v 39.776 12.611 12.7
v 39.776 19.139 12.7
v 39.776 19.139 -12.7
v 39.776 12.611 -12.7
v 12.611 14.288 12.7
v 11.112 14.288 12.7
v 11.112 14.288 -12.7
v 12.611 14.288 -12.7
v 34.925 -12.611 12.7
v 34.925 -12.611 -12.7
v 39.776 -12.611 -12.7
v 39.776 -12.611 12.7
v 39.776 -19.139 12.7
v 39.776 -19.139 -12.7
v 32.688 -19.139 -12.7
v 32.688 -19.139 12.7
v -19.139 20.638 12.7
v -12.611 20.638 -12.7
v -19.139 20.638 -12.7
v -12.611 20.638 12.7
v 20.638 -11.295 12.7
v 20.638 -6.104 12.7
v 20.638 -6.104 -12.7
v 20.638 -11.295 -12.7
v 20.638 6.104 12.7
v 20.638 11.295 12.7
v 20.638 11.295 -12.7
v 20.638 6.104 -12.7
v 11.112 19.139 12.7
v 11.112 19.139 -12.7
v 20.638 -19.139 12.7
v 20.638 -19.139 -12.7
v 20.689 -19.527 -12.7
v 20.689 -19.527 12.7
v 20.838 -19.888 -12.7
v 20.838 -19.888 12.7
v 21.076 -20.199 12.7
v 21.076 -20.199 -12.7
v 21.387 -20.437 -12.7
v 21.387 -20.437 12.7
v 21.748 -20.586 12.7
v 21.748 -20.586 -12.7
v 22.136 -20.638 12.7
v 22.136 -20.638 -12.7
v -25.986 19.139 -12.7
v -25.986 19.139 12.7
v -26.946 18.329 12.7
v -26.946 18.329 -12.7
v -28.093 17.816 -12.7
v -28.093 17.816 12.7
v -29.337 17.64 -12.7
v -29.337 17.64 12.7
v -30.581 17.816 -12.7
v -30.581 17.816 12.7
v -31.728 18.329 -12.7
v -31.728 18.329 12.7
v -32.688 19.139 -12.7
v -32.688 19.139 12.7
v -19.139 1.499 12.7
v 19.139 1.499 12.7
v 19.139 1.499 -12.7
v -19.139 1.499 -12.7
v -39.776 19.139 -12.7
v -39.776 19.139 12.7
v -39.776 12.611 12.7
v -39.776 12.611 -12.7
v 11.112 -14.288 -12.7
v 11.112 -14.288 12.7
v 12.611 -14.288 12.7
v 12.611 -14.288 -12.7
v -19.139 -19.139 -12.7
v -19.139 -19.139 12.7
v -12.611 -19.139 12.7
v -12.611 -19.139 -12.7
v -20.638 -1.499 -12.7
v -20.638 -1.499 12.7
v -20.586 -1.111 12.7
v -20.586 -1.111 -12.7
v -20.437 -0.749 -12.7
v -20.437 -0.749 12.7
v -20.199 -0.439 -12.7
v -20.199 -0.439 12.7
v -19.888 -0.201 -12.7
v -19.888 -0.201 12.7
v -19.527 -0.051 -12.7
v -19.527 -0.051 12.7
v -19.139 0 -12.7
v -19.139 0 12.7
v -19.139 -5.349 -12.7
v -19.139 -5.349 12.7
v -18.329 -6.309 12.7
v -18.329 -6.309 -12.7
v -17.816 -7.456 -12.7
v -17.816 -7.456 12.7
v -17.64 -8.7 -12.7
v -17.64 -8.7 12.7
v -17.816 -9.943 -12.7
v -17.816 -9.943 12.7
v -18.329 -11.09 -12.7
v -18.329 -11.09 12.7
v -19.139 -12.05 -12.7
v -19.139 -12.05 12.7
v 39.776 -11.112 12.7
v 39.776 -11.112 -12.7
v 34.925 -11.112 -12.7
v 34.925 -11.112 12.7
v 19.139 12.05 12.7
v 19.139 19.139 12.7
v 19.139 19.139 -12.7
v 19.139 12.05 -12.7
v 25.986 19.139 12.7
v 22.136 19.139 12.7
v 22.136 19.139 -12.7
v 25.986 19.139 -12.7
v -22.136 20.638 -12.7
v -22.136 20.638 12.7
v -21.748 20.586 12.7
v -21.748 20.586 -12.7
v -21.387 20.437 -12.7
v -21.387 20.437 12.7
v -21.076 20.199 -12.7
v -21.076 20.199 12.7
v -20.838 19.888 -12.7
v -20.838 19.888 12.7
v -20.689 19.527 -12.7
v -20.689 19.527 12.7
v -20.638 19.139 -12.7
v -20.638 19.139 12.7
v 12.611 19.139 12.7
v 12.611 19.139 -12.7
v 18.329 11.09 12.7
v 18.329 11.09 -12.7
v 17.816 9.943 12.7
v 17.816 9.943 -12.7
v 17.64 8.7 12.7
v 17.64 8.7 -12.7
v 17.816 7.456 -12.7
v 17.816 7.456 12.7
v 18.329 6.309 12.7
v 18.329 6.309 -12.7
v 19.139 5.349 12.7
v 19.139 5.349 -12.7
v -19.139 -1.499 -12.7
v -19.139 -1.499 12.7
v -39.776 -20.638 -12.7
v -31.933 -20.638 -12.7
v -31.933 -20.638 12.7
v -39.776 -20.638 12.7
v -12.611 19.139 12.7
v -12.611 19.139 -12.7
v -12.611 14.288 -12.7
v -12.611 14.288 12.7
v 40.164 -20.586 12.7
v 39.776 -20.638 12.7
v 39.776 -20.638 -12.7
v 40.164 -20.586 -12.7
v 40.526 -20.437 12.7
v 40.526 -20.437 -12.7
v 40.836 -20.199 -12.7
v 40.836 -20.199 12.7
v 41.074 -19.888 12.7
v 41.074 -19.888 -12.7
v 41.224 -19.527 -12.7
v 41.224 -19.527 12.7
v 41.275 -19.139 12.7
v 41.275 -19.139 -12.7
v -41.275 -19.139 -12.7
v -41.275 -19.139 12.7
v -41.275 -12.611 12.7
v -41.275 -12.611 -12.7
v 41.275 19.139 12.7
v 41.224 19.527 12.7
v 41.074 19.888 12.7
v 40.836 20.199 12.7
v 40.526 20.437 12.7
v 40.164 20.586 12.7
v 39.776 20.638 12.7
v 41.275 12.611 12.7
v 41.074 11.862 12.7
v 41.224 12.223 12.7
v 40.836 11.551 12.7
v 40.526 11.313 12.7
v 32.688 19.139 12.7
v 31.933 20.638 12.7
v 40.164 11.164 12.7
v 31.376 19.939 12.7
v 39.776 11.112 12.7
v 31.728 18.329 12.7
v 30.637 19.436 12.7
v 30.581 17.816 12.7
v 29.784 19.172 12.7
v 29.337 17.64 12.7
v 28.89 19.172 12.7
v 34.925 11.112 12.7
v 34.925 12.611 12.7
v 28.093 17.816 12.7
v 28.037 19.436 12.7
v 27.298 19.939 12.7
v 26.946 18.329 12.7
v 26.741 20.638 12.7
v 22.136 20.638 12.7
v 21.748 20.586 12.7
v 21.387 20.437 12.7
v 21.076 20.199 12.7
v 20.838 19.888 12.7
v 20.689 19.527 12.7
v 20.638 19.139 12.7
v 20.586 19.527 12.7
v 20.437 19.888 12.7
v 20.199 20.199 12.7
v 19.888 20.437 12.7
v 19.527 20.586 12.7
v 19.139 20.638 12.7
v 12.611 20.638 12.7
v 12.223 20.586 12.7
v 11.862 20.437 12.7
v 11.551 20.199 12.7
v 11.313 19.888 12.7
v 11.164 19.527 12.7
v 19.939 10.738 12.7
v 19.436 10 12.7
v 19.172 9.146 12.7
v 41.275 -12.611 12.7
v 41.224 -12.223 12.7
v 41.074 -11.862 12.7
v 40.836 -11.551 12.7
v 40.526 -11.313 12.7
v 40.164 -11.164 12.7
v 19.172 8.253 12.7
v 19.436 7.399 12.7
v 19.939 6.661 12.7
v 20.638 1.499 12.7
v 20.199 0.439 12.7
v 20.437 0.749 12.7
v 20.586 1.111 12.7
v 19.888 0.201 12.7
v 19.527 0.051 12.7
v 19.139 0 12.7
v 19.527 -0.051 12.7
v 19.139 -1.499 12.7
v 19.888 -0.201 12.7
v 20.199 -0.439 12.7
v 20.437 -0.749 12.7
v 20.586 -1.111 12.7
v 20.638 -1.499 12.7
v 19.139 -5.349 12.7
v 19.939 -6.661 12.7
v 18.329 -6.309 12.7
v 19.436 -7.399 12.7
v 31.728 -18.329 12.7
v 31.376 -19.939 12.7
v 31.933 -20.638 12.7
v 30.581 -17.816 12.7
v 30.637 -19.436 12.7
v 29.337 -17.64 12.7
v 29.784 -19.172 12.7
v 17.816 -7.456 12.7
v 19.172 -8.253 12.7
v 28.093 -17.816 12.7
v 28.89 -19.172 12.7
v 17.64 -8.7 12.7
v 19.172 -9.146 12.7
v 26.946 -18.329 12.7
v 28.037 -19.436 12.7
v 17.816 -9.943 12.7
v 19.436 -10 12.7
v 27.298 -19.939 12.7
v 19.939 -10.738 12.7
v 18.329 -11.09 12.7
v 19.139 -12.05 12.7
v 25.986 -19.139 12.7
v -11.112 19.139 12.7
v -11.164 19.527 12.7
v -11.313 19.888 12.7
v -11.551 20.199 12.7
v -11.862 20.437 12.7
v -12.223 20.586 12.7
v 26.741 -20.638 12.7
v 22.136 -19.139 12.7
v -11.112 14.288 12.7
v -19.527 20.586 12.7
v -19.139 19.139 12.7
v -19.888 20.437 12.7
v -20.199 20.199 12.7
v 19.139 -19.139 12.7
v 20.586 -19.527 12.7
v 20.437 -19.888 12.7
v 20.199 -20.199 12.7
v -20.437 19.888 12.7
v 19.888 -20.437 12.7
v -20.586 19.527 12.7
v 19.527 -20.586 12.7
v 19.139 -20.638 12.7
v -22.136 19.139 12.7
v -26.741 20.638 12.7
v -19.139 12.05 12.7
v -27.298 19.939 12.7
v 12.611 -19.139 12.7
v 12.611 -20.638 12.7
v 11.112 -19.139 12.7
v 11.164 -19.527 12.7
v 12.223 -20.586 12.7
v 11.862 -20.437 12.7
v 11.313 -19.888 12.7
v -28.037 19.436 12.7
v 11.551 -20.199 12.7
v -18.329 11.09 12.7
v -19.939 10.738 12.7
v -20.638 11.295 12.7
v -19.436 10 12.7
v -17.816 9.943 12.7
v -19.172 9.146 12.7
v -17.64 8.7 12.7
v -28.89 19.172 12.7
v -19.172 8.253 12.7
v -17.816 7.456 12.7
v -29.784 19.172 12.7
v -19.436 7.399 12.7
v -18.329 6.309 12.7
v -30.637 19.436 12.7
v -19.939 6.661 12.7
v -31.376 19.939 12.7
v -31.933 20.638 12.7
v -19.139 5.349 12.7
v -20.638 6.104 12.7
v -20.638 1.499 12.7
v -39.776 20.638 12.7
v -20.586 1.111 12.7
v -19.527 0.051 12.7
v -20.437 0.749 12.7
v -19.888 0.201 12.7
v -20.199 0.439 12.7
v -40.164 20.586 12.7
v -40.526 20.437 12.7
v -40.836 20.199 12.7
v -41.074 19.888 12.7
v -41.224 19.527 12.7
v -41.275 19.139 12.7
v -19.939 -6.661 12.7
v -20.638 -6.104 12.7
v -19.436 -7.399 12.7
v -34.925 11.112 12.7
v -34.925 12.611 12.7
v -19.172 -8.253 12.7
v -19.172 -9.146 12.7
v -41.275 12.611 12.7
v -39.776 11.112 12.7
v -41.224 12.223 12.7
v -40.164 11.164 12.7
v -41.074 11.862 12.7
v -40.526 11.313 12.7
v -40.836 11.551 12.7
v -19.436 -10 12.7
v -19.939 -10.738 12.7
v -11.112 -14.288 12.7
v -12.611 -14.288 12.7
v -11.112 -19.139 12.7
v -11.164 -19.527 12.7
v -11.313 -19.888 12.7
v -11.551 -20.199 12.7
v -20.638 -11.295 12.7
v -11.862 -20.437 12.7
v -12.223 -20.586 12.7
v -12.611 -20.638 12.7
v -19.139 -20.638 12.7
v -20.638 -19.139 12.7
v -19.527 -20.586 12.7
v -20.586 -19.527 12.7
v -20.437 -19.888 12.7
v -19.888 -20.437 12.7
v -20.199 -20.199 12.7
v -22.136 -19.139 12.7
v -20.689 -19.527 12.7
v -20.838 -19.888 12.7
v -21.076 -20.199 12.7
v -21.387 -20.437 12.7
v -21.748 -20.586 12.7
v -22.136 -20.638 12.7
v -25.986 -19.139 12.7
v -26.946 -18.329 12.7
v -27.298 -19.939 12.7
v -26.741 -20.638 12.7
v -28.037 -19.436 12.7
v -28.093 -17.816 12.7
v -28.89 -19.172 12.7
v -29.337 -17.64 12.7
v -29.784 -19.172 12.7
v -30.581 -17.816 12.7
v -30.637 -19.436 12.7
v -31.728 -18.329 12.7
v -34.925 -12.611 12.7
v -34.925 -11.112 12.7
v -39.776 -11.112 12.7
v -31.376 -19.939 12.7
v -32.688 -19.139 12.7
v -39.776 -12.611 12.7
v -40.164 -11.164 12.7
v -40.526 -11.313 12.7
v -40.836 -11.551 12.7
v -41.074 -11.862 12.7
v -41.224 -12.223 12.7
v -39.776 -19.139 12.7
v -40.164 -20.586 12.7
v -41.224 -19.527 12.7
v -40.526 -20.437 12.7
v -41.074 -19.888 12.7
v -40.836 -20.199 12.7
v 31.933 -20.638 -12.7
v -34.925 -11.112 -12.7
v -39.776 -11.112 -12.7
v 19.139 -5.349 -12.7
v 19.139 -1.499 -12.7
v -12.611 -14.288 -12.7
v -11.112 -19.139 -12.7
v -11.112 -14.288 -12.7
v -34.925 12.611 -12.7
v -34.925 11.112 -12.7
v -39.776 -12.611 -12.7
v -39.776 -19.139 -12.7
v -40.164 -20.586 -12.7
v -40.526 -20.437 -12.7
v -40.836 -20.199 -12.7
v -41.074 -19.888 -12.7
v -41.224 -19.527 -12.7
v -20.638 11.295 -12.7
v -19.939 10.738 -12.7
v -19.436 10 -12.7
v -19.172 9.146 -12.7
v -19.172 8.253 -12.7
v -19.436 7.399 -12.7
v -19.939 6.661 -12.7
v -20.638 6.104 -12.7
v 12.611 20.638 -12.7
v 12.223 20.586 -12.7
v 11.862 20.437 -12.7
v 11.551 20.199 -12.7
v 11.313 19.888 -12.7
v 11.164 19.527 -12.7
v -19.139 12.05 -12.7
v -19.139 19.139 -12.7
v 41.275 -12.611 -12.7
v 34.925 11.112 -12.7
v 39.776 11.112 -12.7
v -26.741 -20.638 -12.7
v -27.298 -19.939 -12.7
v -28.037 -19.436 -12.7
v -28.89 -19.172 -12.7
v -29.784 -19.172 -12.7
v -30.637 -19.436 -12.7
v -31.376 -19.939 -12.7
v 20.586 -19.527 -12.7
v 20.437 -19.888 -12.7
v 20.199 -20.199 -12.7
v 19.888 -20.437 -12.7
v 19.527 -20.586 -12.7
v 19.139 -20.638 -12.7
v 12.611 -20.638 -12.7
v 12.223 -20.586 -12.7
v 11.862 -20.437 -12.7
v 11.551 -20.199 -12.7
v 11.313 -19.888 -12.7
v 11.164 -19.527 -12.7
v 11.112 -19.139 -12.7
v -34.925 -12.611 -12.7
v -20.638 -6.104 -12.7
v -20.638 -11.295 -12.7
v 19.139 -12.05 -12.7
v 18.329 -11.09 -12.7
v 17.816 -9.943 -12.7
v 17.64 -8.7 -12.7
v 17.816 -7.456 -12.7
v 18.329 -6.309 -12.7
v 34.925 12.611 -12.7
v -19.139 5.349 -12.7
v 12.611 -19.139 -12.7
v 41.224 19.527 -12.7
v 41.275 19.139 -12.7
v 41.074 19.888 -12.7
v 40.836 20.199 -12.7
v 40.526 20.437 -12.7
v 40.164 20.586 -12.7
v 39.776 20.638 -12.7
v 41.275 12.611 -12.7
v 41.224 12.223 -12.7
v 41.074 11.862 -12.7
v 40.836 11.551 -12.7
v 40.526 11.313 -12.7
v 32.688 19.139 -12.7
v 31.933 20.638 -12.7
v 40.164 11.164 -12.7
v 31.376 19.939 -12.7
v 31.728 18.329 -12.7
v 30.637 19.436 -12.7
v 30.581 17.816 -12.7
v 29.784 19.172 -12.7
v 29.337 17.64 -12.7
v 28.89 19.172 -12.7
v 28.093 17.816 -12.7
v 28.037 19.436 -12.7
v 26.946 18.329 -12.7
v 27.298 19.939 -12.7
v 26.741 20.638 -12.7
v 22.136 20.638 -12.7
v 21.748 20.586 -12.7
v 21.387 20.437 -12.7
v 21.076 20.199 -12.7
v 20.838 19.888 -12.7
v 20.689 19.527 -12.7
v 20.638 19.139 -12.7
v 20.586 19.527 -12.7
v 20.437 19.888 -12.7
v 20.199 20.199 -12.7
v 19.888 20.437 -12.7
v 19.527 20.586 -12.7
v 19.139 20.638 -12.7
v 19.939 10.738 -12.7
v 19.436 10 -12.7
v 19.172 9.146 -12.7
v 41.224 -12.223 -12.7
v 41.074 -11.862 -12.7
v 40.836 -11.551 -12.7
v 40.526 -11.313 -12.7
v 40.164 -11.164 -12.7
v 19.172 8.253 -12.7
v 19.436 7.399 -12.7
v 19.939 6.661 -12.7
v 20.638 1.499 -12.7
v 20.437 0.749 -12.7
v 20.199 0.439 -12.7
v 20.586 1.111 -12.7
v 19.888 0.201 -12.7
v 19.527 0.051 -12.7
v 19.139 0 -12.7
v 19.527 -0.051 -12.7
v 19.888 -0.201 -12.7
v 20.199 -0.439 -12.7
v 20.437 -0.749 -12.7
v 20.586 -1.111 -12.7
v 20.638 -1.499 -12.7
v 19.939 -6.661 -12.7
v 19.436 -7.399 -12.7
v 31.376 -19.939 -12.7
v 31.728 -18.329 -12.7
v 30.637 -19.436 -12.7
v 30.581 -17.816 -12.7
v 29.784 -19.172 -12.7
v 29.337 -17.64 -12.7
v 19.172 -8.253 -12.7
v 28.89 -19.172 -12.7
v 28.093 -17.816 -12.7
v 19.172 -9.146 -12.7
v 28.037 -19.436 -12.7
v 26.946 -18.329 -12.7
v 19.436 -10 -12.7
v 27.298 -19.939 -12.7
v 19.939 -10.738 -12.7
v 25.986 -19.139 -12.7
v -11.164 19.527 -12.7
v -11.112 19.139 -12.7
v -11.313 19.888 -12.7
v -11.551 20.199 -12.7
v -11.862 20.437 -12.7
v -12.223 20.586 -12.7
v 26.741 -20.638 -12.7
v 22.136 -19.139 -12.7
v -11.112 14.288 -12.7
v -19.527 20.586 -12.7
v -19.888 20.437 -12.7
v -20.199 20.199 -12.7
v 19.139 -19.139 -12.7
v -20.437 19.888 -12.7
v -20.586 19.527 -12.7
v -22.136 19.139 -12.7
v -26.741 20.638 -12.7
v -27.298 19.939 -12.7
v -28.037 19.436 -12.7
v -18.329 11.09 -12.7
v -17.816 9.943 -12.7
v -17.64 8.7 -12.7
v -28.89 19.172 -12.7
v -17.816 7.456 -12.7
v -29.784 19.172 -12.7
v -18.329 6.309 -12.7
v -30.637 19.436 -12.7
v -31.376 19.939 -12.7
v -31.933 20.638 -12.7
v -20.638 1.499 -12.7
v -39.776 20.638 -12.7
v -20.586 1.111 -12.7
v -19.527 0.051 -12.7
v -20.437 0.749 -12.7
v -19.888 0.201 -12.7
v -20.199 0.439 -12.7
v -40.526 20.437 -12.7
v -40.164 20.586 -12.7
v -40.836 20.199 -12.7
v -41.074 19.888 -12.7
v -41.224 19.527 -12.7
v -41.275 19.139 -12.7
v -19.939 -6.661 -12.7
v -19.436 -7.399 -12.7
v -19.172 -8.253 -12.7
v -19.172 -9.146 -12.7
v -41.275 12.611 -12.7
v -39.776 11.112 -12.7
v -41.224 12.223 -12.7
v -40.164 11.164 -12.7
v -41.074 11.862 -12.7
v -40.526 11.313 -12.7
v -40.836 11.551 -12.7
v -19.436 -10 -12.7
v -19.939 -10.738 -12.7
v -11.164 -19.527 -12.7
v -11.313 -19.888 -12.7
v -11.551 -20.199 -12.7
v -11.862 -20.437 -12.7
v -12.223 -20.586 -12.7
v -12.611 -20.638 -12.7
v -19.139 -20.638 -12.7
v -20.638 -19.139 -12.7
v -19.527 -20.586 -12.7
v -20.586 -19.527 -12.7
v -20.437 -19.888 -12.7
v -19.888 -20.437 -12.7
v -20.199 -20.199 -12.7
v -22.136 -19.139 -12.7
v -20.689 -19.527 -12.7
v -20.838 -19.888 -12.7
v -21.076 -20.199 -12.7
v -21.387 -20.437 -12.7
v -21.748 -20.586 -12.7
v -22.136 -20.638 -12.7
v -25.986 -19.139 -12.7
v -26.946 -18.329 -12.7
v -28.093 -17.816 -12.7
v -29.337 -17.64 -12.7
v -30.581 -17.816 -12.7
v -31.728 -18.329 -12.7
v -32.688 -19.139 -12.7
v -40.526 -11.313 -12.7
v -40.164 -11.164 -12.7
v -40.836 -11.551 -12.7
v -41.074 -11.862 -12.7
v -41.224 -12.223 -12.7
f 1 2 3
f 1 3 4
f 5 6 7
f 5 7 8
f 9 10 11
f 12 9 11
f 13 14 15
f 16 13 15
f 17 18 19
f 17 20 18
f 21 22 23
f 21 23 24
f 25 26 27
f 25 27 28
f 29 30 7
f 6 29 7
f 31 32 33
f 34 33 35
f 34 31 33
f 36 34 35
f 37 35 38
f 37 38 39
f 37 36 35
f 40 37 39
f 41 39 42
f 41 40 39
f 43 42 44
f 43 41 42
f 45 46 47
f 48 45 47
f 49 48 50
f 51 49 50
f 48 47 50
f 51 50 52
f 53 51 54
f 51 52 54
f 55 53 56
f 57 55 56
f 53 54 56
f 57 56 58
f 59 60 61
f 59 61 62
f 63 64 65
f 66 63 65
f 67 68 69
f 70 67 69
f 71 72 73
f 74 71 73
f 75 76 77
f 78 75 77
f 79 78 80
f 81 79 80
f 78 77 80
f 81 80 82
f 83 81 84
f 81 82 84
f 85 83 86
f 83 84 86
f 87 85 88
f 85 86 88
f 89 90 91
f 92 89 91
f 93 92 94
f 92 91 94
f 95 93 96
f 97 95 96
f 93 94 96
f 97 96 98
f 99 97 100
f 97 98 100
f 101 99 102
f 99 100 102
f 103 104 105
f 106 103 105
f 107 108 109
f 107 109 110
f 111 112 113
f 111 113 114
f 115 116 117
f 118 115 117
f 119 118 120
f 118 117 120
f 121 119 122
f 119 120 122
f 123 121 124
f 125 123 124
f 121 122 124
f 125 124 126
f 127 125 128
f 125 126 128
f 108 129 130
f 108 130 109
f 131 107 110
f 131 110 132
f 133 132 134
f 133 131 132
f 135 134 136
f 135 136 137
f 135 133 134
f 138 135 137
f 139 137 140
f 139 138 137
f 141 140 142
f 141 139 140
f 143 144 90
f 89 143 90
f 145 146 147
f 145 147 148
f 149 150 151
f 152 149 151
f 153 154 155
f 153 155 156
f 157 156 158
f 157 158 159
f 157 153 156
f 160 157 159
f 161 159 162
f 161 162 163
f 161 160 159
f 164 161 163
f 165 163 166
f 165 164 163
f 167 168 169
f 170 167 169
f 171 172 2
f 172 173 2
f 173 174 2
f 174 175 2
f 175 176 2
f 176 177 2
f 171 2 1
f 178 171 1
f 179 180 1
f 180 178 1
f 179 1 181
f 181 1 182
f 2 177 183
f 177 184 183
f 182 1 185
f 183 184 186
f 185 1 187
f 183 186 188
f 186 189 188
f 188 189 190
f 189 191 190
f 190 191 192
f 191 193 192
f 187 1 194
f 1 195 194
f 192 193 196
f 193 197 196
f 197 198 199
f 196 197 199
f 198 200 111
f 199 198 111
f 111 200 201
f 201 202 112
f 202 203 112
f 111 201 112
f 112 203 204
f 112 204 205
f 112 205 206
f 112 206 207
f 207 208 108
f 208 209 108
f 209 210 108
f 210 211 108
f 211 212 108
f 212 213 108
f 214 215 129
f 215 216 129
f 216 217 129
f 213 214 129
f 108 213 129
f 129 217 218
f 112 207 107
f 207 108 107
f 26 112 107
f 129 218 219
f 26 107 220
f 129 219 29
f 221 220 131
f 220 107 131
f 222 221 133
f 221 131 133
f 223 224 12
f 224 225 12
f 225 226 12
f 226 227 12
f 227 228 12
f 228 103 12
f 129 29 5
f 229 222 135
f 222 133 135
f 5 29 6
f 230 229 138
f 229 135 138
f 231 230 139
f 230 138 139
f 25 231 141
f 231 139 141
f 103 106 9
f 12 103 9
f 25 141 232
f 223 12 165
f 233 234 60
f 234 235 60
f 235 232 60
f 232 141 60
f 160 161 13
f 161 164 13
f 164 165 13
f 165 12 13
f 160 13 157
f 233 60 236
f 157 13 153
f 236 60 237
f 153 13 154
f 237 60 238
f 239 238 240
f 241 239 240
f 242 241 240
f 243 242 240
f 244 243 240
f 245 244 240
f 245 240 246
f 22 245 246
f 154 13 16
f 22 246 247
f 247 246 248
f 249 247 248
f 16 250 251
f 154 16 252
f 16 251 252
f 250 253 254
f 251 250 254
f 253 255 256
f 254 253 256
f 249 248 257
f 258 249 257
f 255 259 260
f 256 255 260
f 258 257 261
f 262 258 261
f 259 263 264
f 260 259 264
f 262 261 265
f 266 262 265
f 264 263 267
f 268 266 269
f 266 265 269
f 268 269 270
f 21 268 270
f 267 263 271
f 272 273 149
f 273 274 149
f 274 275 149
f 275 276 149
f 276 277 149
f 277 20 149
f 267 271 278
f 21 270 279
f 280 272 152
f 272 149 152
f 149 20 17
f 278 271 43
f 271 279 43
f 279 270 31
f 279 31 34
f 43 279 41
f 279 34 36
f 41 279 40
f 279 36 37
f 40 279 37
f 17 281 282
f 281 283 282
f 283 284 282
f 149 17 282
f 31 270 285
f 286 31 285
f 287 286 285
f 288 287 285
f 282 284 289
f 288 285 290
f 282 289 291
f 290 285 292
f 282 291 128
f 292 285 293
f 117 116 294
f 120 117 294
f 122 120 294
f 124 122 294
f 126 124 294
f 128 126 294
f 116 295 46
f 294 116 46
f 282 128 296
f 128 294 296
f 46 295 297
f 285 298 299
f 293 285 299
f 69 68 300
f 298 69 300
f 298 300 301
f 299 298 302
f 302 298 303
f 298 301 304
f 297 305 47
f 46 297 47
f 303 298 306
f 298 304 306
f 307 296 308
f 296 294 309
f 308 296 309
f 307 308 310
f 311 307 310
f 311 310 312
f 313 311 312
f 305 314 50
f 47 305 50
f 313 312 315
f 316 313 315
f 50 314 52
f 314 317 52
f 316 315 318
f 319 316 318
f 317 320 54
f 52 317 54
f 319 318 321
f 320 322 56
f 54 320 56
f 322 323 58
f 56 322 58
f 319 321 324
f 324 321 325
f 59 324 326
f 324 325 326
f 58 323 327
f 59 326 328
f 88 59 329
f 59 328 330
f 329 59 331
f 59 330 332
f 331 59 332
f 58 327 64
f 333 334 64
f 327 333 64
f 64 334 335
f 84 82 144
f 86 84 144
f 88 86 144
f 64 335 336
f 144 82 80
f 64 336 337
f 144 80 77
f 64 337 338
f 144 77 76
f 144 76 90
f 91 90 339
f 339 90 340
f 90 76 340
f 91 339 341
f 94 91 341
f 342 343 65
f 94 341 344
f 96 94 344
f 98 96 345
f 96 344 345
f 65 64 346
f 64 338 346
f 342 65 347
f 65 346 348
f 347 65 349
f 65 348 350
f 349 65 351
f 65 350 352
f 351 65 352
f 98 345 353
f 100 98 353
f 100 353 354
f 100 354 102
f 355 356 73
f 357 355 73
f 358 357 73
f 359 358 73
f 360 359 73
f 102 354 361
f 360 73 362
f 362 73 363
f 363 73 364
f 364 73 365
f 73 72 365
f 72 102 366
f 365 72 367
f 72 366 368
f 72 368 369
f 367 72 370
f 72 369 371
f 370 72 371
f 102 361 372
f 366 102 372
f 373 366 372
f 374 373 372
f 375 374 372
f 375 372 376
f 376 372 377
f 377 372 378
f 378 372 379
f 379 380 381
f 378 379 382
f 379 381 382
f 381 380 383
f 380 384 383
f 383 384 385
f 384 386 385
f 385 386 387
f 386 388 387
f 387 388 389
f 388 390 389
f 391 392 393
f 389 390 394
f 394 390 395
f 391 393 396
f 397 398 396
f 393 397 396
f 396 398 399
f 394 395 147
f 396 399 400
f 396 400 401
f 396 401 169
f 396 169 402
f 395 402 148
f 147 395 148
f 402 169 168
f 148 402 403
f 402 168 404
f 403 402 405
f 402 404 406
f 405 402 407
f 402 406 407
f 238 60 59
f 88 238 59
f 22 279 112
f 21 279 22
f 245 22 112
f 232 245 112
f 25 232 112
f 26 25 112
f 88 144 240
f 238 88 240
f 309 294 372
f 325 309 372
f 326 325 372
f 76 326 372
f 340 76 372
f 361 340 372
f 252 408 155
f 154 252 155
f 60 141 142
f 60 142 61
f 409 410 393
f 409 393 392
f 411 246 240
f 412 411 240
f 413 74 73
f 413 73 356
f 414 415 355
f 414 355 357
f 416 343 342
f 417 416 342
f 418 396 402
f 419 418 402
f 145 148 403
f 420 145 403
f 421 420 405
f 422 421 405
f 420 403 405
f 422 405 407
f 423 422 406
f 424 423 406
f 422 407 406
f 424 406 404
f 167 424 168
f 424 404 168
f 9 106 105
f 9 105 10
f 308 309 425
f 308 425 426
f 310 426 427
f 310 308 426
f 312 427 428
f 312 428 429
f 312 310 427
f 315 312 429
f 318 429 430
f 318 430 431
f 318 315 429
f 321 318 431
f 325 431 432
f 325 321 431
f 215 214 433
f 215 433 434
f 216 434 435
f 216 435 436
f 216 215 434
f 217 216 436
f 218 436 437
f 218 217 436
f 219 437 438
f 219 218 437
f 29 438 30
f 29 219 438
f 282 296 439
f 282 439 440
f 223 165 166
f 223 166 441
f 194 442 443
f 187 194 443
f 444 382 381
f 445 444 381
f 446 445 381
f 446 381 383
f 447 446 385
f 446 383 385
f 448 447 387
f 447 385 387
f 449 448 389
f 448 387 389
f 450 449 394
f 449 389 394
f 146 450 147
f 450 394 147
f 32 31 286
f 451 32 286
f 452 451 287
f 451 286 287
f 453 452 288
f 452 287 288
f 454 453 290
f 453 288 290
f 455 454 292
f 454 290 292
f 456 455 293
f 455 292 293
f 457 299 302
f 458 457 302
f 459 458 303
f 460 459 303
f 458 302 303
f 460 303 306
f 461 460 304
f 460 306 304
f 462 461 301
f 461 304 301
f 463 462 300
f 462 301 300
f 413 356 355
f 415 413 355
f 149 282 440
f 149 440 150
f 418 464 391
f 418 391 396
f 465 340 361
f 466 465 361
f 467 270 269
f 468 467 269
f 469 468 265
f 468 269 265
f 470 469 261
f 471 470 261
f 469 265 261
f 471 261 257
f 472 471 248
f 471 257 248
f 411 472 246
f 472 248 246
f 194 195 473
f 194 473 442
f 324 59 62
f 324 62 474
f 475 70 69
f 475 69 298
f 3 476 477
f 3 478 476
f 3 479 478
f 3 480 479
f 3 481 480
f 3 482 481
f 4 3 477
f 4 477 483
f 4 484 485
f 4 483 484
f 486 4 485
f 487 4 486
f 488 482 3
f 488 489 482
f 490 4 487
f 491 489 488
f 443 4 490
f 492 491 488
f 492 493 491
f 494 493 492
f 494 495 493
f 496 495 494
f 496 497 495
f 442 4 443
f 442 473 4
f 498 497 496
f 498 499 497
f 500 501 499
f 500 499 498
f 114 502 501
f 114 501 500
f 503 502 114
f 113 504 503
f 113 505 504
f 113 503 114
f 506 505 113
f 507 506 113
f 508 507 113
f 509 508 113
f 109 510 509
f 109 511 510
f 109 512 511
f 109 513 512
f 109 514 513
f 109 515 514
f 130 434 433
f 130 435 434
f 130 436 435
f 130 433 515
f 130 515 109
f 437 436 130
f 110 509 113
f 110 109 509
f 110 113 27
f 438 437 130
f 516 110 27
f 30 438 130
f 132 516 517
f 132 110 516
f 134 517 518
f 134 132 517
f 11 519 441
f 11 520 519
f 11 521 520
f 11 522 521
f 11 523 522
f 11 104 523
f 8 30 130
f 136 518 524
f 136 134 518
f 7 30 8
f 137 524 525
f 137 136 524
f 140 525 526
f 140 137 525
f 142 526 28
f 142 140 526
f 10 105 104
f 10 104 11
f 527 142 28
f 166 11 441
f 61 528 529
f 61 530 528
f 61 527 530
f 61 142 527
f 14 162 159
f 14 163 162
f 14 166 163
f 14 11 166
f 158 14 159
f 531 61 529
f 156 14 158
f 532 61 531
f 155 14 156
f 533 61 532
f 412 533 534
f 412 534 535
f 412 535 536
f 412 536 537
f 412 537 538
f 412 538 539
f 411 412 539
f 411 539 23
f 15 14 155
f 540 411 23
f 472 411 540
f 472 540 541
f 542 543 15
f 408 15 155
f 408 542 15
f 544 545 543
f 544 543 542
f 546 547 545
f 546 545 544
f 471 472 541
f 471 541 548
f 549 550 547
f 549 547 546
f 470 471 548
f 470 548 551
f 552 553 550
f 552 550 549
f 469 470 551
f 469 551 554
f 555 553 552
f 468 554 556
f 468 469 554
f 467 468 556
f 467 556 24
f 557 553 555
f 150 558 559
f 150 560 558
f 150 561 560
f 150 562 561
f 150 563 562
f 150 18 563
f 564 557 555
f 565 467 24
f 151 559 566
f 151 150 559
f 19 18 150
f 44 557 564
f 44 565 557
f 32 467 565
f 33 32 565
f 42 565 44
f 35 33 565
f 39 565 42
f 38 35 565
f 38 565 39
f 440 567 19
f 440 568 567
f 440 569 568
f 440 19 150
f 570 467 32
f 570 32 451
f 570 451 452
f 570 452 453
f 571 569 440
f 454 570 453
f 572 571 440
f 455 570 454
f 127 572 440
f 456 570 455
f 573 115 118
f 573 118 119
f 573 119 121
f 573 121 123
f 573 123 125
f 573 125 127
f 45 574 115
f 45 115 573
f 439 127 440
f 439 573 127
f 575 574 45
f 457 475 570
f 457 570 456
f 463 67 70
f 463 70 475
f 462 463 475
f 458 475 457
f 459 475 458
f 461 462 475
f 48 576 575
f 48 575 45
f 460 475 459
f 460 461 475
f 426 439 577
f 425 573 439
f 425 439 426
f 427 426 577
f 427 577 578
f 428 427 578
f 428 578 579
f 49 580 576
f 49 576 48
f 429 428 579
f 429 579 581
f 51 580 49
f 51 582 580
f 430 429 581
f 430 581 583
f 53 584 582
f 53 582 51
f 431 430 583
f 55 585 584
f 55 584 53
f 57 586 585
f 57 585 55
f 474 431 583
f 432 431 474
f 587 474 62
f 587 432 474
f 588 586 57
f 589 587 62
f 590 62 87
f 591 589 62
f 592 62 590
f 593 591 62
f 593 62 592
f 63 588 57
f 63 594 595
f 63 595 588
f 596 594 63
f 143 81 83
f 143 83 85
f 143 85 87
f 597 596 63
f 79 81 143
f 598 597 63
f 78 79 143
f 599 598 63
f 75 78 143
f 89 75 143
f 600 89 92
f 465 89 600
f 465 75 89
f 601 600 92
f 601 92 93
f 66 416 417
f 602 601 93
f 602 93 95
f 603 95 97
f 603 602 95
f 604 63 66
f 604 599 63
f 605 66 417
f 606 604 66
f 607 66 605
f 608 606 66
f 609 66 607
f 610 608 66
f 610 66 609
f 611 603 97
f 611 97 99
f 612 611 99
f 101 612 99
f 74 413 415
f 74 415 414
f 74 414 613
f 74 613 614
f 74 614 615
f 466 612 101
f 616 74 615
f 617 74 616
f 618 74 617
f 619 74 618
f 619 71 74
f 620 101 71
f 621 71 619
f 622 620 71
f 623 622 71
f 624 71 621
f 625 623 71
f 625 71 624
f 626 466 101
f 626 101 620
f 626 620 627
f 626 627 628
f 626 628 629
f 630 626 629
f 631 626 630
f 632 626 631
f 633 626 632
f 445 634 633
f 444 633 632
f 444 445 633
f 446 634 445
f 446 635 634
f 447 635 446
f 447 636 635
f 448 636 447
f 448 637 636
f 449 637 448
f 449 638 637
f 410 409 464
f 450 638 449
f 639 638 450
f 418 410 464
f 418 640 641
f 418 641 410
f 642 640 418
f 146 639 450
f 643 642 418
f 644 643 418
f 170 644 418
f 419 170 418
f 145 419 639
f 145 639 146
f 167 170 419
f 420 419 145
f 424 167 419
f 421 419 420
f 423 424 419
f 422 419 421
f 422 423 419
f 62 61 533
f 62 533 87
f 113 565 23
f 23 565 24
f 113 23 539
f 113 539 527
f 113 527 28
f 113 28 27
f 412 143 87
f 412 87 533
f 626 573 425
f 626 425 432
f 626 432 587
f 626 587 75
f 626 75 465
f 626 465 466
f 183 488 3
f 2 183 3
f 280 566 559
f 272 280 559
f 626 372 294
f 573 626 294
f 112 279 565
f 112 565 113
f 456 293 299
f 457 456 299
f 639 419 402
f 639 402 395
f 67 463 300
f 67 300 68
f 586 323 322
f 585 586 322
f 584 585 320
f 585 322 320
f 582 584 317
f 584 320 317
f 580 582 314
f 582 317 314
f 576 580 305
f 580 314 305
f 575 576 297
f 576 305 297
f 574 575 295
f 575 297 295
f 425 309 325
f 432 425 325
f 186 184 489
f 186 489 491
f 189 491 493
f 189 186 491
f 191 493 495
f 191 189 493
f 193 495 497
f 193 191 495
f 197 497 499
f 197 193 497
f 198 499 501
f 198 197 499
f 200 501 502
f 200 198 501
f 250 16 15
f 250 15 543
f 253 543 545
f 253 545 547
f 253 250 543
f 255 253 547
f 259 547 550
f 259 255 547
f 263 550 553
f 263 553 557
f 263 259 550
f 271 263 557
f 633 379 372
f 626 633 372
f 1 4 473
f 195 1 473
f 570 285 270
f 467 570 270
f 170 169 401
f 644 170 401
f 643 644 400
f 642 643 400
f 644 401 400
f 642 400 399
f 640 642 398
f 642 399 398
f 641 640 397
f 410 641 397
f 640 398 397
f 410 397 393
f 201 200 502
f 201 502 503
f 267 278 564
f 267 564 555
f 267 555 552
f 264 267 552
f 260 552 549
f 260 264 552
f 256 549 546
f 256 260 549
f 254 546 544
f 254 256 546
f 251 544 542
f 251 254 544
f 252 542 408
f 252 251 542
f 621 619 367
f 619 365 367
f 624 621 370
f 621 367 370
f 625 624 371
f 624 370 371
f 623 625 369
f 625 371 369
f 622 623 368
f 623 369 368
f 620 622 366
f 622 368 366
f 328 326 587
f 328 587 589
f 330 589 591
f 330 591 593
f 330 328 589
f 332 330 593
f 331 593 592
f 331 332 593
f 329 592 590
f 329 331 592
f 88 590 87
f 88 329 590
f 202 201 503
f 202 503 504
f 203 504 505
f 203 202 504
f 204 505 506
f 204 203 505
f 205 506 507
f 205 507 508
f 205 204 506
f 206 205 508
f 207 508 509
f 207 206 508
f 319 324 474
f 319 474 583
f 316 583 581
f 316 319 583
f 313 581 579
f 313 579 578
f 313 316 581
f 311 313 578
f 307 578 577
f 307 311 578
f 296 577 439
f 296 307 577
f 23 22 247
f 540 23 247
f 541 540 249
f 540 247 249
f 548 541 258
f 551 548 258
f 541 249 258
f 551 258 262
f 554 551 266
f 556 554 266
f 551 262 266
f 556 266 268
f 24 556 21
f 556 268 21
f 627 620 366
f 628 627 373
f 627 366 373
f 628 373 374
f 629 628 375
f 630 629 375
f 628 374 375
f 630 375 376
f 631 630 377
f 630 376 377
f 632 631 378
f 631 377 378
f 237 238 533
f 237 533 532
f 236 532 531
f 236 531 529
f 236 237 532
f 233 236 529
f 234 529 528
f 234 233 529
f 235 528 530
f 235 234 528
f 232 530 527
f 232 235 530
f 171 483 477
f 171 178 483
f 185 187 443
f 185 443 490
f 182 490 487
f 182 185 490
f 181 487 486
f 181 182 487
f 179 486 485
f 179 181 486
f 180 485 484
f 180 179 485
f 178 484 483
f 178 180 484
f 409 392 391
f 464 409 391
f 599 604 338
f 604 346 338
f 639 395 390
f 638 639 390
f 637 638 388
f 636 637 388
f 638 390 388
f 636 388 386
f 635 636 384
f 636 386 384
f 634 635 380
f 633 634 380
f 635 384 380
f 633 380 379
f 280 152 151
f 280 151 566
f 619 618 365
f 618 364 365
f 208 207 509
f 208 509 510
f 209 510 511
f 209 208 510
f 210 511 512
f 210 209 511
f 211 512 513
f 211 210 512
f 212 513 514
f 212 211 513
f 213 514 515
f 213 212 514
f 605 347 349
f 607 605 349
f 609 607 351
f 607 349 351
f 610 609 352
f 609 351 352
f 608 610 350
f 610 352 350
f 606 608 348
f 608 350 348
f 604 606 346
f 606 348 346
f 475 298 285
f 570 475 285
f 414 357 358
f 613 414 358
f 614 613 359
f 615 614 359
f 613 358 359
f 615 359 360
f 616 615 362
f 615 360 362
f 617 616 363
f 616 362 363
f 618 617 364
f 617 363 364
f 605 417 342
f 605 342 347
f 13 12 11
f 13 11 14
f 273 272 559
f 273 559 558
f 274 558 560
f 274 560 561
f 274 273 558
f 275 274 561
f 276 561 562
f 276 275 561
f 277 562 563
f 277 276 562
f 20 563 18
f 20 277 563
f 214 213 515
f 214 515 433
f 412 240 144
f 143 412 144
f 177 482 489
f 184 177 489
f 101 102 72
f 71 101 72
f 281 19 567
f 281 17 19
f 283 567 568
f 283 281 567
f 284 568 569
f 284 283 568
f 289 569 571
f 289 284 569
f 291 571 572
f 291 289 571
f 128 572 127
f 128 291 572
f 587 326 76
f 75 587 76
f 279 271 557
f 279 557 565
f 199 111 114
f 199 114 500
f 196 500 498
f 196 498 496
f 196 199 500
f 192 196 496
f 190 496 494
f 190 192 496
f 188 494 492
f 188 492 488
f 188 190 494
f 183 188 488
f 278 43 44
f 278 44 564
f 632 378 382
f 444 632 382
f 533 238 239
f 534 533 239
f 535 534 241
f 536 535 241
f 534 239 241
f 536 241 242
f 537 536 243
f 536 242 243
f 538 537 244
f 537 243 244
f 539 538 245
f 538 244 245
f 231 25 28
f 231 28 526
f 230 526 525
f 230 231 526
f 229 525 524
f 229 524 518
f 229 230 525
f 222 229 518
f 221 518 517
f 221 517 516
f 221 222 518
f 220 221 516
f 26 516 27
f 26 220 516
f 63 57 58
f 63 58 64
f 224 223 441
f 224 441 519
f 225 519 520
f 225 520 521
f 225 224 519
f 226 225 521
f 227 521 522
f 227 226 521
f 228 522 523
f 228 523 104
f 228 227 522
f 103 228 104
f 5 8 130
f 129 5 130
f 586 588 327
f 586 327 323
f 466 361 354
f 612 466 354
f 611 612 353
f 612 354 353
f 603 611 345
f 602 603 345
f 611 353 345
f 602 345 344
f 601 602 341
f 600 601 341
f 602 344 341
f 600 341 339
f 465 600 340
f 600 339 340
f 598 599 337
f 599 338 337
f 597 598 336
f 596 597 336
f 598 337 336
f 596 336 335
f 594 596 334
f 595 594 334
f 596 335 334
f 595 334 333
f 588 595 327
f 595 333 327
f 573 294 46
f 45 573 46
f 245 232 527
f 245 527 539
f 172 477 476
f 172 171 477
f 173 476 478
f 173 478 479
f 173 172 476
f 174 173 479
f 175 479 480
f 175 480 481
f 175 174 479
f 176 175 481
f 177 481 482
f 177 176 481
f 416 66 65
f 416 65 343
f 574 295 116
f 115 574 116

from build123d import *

# Parameters (mm, degrees)
BASE_EXTRUDE_DEPTH  = 12.7
BOSS_EXTRUDE1_DEPTH = 12.7


with BuildPart() as part:
    # Sketch1 → Base-Extrude (new, symmetric)
    with BuildSketch(Plane.XY):
        with BuildLine():
            Line((-20.6375, 19.1389), (-20.6375, 11.29515134))
            ThreePointArc((-20.6375, 11.29515134), (-19.1389, 8.6995), (-20.6375, 6.10384866))
            Line((-20.6375, 6.10384866), (-20.6375, 1.4986))
            ThreePointArc((-20.6375, 1.4986), (-20.198570222, 0.438929778), (-19.1389, 0))
            Line((-19.1389, 0), (19.1389, 0))
            ThreePointArc((19.1389, 0), (20.198570222, 0.438929778), (20.6375, 1.4986))
            Line((20.6375, 1.4986), (20.6375, 6.10384866))
            ThreePointArc((20.6375, 6.10384866), (19.1389, 8.6995), (20.6375, 11.29515134))
            Line((20.6375, 11.29515134), (20.6375, 19.1389))
            ThreePointArc((20.6375, 19.1389), (20.198570222, 20.198570222), (19.1389, 20.6375))
            Line((19.1389, 20.6375), (12.6111, 20.6375))
            ThreePointArc((12.6111, 20.6375), (11.551429778, 20.198570222), (11.1125, 19.1389))
            Line((11.1125, 19.1389), (11.1125, 14.2875))
            Line((11.1125, 14.2875), (12.6111, 14.2875))
            Line((12.6111, 14.2875), (12.6111, 19.1389))
            Line((12.6111, 19.1389), (19.1389, 19.1389))
            Line((19.1389, 19.1389), (19.1389, 12.050471471))
            ThreePointArc((19.1389, 12.050471471), (17.6403, 8.6995), (19.1389, 5.348528529))
            Line((19.1389, 5.348528529), (19.1389, 1.4986))
            Line((19.1389, 1.4986), (-19.1389, 1.4986))
            Line((-19.1389, 1.4986), (-19.1389, 5.348528529))
            ThreePointArc((-19.1389, 5.348528529), (-17.6403, 8.6995), (-19.1389, 12.050471471))
            Line((-19.1389, 12.050471471), (-19.1389, 19.1389))
            Line((-19.1389, 19.1389), (-12.6111, 19.1389))
            Line((-12.6111, 19.1389), (-12.6111, 14.2875))
            Line((-12.6111, 14.2875), (-11.1125, 14.2875))
            Line((-11.1125, 14.2875), (-11.1125, 19.1389))
            ThreePointArc((-11.1125, 19.1389), (-11.551429778, 20.198570222), (-12.6111, 20.6375))
            Line((-12.6111, 20.6375), (-19.1389, 20.6375))
            ThreePointArc((-19.1389, 20.6375), (-20.198570222, 20.198570222), (-20.6375, 19.1389))
        make_face()
    base_extrude = extrude(amount=BASE_EXTRUDE_DEPTH, both=True)

    # Mirror1: Base-Extrude across plane
    add(base_extrude.mirror(Plane.ZX))

    # Sketch2 → Boss-Extrude1 (add, symmetric)
    with BuildSketch(Plane(origin=(20.16125, 0.15875, 0), x_dir=(0, -1, 0), z_dir=(0, 0, 1))):
        with BuildLine():
            Line((-20.47875, 19.61515), (-20.47875, 11.77140134))
            ThreePointArc((-20.47875, 11.77140134), (-18.98015, 9.17575), (-20.47875, 6.58009866))
            Line((-20.47875, 6.58009866), (-20.47875, 1.97485))
            ThreePointArc((-20.47875, 1.97485), (-20.039820222, 0.915179778), (-18.98015, 0.47625))
            Line((-18.98015, 0.47625), (19.29765, 0.47625))
            ThreePointArc((19.29765, 0.47625), (20.357320222, 0.915179778), (20.79625, 1.97485))
            Line((20.79625, 1.97485), (20.79625, 6.58009866))
            ThreePointArc((20.79625, 6.58009866), (19.29765, 9.17575), (20.79625, 11.77140134))
            Line((20.79625, 11.77140134), (20.79625, 19.61515))
            ThreePointArc((20.79625, 19.61515), (20.357320222, 20.674820222), (19.29765, 21.11375))
            Line((19.29765, 21.11375), (12.76985, 21.11375))
            ThreePointArc((12.76985, 21.11375), (11.710179778, 20.674820222), (11.27125, 19.61515))
            Line((11.27125, 19.61515), (11.27125, 14.76375))
            Line((11.27125, 14.76375), (12.76985, 14.76375))
            Line((12.76985, 14.76375), (12.76985, 19.61515))
            Line((12.76985, 19.61515), (19.29765, 19.61515))
            Line((19.29765, 19.61515), (19.29765, 12.526721471))
            ThreePointArc((19.29765, 12.526721471), (17.79905, 9.17575), (19.29765, 5.824778529))
            Line((19.29765, 5.824778529), (19.29765, 1.97485))
            Line((19.29765, 1.97485), (-18.98015, 1.97485))
            Line((-18.98015, 1.97485), (-18.98015, 5.824778529))
            ThreePointArc((-18.98015, 5.824778529), (-17.48155, 9.17575), (-18.98015, 12.526721471))
            Line((-18.98015, 12.526721471), (-18.98015, 19.61515))
            Line((-18.98015, 19.61515), (-12.45235, 19.61515))
            Line((-12.45235, 19.61515), (-12.45235, 14.76375))
            Line((-12.45235, 14.76375), (-10.95375, 14.76375))
            Line((-10.95375, 14.76375), (-10.95375, 19.61515))
            ThreePointArc((-10.95375, 19.61515), (-11.392679778, 20.674820222), (-12.45235, 21.11375))
            Line((-12.45235, 21.11375), (-18.98015, 21.11375))
            ThreePointArc((-18.98015, 21.11375), (-20.039820222, 20.674820222), (-20.47875, 19.61515))
        make_face()
    boss_extrude1 = extrude(amount=BOSS_EXTRUDE1_DEPTH, both=True)

    # Mirror2: Boss-Extrude1 across plane
    add(boss_extrude1.mirror(Plane(origin=(0, 0, 0), x_dir=(0, 0, 1), z_dir=(1, 0, 0))))


solid = part.part
